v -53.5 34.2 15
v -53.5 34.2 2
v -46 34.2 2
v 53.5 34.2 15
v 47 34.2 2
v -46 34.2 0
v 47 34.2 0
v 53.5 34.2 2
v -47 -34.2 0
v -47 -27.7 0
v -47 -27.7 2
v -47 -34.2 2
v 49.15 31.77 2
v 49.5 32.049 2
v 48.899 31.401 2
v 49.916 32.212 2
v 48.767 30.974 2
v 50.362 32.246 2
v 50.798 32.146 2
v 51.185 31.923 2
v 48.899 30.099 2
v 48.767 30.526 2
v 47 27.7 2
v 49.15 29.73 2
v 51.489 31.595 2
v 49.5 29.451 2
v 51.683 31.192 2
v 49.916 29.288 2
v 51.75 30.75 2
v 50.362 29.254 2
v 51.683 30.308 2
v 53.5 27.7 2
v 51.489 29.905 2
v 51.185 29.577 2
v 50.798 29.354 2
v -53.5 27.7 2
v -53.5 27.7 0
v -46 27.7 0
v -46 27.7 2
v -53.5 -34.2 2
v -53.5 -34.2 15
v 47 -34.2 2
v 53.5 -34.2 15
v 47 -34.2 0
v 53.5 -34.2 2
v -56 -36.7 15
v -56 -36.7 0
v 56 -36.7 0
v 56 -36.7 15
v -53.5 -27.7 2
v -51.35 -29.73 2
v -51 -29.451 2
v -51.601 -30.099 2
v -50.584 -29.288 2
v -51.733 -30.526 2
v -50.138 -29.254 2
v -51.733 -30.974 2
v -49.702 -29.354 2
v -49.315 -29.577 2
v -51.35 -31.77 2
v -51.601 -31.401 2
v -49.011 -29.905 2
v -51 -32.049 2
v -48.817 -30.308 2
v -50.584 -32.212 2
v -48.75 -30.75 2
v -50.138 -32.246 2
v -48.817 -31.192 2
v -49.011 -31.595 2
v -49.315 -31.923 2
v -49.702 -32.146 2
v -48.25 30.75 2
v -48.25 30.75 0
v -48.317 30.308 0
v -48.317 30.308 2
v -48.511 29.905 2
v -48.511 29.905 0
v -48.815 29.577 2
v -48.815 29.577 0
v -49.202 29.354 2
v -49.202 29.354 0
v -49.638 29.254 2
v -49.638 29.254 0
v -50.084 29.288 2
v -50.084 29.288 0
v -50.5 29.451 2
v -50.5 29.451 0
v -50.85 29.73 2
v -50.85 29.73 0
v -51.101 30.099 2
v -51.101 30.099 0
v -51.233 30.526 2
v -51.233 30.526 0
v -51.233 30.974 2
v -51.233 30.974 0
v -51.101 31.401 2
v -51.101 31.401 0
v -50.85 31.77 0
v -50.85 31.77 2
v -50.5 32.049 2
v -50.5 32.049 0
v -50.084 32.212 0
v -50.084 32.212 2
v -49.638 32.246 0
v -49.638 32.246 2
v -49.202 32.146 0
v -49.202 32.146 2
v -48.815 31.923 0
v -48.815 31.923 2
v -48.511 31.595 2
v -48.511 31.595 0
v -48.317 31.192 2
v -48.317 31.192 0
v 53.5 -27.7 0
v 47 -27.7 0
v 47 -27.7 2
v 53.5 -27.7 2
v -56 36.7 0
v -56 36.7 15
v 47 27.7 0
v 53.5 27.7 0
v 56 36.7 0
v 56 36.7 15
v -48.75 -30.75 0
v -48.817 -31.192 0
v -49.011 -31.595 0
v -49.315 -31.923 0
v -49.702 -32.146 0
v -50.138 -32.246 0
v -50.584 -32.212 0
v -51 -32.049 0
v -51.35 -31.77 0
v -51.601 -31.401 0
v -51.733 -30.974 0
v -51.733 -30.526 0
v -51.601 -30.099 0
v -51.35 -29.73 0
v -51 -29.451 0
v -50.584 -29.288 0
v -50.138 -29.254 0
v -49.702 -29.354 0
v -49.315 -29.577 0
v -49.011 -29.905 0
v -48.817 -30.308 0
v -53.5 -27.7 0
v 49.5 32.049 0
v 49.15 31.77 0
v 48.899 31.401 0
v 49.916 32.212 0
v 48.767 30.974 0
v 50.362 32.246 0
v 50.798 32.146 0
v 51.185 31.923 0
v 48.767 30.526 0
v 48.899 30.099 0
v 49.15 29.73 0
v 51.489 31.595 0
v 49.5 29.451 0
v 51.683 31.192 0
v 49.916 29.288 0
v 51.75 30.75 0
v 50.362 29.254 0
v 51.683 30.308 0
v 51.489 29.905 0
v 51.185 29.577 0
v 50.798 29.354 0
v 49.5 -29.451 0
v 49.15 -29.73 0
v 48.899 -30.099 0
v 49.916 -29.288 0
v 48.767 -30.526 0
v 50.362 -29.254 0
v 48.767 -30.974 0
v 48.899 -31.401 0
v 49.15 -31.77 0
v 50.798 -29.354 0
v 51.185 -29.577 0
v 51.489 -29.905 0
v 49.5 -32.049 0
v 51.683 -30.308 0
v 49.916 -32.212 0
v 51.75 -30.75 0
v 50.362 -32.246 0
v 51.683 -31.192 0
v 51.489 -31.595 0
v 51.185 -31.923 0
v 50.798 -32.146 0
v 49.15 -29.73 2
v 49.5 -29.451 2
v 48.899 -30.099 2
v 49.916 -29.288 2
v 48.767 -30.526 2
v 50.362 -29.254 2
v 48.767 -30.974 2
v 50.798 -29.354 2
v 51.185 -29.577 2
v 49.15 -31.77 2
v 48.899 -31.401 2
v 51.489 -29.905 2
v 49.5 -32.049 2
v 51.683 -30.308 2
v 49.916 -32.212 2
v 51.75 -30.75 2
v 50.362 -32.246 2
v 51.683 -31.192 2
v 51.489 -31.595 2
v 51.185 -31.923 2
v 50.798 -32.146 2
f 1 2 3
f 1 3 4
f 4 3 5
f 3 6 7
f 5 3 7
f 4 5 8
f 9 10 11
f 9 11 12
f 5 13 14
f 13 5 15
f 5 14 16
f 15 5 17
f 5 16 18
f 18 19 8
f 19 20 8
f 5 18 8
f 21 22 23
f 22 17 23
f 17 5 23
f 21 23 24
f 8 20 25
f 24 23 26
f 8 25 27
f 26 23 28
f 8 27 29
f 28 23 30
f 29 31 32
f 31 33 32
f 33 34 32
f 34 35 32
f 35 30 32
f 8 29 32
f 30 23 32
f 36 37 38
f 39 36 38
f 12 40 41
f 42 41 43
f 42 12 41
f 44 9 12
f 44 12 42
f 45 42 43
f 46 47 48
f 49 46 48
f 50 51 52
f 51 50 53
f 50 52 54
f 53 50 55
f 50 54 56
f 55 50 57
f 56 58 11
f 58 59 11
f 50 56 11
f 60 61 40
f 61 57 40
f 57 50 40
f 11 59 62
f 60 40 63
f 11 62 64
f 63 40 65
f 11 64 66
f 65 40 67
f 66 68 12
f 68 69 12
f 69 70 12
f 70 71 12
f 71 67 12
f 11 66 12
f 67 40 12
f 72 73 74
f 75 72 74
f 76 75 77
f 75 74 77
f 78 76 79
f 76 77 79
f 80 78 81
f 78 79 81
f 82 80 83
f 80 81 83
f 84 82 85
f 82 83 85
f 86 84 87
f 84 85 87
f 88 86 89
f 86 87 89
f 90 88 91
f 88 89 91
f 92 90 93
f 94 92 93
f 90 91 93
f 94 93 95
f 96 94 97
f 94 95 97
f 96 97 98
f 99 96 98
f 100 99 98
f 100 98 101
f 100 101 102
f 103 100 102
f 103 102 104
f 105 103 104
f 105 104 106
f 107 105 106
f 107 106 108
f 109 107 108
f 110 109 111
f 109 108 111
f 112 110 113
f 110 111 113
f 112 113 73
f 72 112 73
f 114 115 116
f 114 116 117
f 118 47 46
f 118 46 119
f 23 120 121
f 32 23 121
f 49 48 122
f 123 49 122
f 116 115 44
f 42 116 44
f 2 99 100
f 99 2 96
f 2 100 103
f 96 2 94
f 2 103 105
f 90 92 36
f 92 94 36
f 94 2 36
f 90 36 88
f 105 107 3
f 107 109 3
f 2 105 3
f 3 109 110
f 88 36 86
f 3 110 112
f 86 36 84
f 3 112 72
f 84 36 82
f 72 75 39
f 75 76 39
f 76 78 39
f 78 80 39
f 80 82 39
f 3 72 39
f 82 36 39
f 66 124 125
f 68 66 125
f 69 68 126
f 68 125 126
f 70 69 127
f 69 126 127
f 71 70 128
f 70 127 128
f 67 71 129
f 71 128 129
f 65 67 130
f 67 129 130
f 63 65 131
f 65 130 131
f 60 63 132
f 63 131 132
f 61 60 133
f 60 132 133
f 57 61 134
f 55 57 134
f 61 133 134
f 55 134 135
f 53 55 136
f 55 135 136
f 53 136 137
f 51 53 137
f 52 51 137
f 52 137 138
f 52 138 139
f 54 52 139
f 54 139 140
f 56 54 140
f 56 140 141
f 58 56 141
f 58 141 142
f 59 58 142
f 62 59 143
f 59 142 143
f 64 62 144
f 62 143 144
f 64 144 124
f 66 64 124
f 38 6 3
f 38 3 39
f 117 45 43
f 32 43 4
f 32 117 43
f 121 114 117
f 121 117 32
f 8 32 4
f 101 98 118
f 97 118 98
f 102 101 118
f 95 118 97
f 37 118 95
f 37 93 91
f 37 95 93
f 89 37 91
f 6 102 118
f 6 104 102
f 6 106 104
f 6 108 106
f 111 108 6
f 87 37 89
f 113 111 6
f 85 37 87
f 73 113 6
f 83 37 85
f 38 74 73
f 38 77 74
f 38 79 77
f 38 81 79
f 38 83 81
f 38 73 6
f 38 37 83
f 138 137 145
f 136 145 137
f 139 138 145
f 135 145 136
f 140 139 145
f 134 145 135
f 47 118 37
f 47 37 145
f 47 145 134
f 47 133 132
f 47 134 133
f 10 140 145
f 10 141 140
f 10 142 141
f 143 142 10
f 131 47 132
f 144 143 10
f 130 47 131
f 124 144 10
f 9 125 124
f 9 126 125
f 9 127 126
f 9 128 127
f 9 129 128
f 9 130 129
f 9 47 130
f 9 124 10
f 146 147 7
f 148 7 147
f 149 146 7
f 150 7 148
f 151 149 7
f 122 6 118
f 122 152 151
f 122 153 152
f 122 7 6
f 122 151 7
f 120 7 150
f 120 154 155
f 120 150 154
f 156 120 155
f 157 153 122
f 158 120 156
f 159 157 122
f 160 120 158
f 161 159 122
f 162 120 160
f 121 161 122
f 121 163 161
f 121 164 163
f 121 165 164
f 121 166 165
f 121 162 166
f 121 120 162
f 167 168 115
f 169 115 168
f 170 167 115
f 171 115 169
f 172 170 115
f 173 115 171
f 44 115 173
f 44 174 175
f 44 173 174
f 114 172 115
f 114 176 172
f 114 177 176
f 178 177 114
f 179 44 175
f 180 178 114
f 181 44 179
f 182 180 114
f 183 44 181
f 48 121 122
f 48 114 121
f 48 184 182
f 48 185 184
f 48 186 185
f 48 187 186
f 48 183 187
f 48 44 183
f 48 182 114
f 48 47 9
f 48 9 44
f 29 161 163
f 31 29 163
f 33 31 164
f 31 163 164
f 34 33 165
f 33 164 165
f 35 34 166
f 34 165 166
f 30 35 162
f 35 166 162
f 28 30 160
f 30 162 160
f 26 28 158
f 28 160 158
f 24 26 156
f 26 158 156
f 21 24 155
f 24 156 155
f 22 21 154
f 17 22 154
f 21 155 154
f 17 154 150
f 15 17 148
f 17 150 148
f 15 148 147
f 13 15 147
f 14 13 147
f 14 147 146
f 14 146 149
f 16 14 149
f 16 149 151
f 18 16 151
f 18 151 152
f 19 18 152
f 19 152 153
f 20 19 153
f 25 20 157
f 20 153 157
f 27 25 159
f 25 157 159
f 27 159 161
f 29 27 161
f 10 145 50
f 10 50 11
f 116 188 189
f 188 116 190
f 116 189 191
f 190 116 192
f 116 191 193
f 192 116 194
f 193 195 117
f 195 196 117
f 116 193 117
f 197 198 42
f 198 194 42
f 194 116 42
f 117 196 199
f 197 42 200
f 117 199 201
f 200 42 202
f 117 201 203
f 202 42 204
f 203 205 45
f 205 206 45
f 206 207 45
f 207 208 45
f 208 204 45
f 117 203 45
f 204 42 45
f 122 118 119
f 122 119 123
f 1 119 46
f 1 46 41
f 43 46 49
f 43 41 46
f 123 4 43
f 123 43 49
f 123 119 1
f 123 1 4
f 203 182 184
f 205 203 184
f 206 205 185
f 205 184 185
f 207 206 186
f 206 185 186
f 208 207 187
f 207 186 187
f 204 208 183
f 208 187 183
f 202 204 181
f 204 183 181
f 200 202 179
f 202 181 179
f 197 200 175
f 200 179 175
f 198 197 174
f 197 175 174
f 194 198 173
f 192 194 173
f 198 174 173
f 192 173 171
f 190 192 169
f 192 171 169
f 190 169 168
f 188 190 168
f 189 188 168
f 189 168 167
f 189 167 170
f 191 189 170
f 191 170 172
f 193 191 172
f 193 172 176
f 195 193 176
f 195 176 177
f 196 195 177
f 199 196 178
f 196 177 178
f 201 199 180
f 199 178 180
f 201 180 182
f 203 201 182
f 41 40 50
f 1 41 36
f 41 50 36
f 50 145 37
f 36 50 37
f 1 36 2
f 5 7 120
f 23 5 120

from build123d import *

# Parameters (mm, degrees)
SKETCH_W      = 112
SKETCH_H      = 73.4
SKETCH_W_2    = 107
SKETCH_H_2    = 68.4
PAD_DEPTH     = 15
SKETCH001_W   = 6.5
SKETCH001_H   = 6.5
SKETCH001_W_2 = 7.5
PAD001_DEPTH  = 2
SKETCH002_R   = 1.5
POCKET_DEPTH  = 2


with BuildPart() as part:
    # Sketch → Pad (new body)
    with BuildSketch(Plane.XY):
        Rectangle(SKETCH_W, SKETCH_H)
        Rectangle(SKETCH_W_2, SKETCH_H_2, mode=Mode.SUBTRACT)
    extrude(amount=PAD_DEPTH)

    # Sketch001 (on Face9 of Pad) → Pad001 (join)
    with BuildSketch(Plane(origin=(0, 0, 0), x_dir=(1, 0, 0), z_dir=(0, 0, -1))):
        with Locations((-50.25, 30.95)):
            Rectangle(SKETCH001_W, SKETCH001_H)
        with Locations((-49.75, -30.95)):
            Rectangle(SKETCH001_W_2, SKETCH001_H)
        with Locations((50.25, 30.95)):
            Rectangle(SKETCH001_W, SKETCH001_H)
        with Locations((50.25, -30.95)):
            Rectangle(SKETCH001_W, SKETCH001_H)
    extrude(amount=-PAD001_DEPTH)

    # Sketch002 (on Face22 of Pad001) → Pocket (cut)
    with BuildSketch(Plane(origin=(0, 0, 0), x_dir=(1, 0, 0), z_dir=(0, 0, -1))):
        with Locations((-50.25, 30.75)):
            Circle(SKETCH002_R)
        with Locations((50.25, -30.75)):
            Circle(SKETCH002_R)
        with Locations((-49.75, -30.75)):
            Circle(SKETCH002_R)
        with Locations((50.25, 30.75)):
            Circle(SKETCH002_R)
    extrude(amount=-POCKET_DEPTH, mode=Mode.SUBTRACT)


solid = part.part
